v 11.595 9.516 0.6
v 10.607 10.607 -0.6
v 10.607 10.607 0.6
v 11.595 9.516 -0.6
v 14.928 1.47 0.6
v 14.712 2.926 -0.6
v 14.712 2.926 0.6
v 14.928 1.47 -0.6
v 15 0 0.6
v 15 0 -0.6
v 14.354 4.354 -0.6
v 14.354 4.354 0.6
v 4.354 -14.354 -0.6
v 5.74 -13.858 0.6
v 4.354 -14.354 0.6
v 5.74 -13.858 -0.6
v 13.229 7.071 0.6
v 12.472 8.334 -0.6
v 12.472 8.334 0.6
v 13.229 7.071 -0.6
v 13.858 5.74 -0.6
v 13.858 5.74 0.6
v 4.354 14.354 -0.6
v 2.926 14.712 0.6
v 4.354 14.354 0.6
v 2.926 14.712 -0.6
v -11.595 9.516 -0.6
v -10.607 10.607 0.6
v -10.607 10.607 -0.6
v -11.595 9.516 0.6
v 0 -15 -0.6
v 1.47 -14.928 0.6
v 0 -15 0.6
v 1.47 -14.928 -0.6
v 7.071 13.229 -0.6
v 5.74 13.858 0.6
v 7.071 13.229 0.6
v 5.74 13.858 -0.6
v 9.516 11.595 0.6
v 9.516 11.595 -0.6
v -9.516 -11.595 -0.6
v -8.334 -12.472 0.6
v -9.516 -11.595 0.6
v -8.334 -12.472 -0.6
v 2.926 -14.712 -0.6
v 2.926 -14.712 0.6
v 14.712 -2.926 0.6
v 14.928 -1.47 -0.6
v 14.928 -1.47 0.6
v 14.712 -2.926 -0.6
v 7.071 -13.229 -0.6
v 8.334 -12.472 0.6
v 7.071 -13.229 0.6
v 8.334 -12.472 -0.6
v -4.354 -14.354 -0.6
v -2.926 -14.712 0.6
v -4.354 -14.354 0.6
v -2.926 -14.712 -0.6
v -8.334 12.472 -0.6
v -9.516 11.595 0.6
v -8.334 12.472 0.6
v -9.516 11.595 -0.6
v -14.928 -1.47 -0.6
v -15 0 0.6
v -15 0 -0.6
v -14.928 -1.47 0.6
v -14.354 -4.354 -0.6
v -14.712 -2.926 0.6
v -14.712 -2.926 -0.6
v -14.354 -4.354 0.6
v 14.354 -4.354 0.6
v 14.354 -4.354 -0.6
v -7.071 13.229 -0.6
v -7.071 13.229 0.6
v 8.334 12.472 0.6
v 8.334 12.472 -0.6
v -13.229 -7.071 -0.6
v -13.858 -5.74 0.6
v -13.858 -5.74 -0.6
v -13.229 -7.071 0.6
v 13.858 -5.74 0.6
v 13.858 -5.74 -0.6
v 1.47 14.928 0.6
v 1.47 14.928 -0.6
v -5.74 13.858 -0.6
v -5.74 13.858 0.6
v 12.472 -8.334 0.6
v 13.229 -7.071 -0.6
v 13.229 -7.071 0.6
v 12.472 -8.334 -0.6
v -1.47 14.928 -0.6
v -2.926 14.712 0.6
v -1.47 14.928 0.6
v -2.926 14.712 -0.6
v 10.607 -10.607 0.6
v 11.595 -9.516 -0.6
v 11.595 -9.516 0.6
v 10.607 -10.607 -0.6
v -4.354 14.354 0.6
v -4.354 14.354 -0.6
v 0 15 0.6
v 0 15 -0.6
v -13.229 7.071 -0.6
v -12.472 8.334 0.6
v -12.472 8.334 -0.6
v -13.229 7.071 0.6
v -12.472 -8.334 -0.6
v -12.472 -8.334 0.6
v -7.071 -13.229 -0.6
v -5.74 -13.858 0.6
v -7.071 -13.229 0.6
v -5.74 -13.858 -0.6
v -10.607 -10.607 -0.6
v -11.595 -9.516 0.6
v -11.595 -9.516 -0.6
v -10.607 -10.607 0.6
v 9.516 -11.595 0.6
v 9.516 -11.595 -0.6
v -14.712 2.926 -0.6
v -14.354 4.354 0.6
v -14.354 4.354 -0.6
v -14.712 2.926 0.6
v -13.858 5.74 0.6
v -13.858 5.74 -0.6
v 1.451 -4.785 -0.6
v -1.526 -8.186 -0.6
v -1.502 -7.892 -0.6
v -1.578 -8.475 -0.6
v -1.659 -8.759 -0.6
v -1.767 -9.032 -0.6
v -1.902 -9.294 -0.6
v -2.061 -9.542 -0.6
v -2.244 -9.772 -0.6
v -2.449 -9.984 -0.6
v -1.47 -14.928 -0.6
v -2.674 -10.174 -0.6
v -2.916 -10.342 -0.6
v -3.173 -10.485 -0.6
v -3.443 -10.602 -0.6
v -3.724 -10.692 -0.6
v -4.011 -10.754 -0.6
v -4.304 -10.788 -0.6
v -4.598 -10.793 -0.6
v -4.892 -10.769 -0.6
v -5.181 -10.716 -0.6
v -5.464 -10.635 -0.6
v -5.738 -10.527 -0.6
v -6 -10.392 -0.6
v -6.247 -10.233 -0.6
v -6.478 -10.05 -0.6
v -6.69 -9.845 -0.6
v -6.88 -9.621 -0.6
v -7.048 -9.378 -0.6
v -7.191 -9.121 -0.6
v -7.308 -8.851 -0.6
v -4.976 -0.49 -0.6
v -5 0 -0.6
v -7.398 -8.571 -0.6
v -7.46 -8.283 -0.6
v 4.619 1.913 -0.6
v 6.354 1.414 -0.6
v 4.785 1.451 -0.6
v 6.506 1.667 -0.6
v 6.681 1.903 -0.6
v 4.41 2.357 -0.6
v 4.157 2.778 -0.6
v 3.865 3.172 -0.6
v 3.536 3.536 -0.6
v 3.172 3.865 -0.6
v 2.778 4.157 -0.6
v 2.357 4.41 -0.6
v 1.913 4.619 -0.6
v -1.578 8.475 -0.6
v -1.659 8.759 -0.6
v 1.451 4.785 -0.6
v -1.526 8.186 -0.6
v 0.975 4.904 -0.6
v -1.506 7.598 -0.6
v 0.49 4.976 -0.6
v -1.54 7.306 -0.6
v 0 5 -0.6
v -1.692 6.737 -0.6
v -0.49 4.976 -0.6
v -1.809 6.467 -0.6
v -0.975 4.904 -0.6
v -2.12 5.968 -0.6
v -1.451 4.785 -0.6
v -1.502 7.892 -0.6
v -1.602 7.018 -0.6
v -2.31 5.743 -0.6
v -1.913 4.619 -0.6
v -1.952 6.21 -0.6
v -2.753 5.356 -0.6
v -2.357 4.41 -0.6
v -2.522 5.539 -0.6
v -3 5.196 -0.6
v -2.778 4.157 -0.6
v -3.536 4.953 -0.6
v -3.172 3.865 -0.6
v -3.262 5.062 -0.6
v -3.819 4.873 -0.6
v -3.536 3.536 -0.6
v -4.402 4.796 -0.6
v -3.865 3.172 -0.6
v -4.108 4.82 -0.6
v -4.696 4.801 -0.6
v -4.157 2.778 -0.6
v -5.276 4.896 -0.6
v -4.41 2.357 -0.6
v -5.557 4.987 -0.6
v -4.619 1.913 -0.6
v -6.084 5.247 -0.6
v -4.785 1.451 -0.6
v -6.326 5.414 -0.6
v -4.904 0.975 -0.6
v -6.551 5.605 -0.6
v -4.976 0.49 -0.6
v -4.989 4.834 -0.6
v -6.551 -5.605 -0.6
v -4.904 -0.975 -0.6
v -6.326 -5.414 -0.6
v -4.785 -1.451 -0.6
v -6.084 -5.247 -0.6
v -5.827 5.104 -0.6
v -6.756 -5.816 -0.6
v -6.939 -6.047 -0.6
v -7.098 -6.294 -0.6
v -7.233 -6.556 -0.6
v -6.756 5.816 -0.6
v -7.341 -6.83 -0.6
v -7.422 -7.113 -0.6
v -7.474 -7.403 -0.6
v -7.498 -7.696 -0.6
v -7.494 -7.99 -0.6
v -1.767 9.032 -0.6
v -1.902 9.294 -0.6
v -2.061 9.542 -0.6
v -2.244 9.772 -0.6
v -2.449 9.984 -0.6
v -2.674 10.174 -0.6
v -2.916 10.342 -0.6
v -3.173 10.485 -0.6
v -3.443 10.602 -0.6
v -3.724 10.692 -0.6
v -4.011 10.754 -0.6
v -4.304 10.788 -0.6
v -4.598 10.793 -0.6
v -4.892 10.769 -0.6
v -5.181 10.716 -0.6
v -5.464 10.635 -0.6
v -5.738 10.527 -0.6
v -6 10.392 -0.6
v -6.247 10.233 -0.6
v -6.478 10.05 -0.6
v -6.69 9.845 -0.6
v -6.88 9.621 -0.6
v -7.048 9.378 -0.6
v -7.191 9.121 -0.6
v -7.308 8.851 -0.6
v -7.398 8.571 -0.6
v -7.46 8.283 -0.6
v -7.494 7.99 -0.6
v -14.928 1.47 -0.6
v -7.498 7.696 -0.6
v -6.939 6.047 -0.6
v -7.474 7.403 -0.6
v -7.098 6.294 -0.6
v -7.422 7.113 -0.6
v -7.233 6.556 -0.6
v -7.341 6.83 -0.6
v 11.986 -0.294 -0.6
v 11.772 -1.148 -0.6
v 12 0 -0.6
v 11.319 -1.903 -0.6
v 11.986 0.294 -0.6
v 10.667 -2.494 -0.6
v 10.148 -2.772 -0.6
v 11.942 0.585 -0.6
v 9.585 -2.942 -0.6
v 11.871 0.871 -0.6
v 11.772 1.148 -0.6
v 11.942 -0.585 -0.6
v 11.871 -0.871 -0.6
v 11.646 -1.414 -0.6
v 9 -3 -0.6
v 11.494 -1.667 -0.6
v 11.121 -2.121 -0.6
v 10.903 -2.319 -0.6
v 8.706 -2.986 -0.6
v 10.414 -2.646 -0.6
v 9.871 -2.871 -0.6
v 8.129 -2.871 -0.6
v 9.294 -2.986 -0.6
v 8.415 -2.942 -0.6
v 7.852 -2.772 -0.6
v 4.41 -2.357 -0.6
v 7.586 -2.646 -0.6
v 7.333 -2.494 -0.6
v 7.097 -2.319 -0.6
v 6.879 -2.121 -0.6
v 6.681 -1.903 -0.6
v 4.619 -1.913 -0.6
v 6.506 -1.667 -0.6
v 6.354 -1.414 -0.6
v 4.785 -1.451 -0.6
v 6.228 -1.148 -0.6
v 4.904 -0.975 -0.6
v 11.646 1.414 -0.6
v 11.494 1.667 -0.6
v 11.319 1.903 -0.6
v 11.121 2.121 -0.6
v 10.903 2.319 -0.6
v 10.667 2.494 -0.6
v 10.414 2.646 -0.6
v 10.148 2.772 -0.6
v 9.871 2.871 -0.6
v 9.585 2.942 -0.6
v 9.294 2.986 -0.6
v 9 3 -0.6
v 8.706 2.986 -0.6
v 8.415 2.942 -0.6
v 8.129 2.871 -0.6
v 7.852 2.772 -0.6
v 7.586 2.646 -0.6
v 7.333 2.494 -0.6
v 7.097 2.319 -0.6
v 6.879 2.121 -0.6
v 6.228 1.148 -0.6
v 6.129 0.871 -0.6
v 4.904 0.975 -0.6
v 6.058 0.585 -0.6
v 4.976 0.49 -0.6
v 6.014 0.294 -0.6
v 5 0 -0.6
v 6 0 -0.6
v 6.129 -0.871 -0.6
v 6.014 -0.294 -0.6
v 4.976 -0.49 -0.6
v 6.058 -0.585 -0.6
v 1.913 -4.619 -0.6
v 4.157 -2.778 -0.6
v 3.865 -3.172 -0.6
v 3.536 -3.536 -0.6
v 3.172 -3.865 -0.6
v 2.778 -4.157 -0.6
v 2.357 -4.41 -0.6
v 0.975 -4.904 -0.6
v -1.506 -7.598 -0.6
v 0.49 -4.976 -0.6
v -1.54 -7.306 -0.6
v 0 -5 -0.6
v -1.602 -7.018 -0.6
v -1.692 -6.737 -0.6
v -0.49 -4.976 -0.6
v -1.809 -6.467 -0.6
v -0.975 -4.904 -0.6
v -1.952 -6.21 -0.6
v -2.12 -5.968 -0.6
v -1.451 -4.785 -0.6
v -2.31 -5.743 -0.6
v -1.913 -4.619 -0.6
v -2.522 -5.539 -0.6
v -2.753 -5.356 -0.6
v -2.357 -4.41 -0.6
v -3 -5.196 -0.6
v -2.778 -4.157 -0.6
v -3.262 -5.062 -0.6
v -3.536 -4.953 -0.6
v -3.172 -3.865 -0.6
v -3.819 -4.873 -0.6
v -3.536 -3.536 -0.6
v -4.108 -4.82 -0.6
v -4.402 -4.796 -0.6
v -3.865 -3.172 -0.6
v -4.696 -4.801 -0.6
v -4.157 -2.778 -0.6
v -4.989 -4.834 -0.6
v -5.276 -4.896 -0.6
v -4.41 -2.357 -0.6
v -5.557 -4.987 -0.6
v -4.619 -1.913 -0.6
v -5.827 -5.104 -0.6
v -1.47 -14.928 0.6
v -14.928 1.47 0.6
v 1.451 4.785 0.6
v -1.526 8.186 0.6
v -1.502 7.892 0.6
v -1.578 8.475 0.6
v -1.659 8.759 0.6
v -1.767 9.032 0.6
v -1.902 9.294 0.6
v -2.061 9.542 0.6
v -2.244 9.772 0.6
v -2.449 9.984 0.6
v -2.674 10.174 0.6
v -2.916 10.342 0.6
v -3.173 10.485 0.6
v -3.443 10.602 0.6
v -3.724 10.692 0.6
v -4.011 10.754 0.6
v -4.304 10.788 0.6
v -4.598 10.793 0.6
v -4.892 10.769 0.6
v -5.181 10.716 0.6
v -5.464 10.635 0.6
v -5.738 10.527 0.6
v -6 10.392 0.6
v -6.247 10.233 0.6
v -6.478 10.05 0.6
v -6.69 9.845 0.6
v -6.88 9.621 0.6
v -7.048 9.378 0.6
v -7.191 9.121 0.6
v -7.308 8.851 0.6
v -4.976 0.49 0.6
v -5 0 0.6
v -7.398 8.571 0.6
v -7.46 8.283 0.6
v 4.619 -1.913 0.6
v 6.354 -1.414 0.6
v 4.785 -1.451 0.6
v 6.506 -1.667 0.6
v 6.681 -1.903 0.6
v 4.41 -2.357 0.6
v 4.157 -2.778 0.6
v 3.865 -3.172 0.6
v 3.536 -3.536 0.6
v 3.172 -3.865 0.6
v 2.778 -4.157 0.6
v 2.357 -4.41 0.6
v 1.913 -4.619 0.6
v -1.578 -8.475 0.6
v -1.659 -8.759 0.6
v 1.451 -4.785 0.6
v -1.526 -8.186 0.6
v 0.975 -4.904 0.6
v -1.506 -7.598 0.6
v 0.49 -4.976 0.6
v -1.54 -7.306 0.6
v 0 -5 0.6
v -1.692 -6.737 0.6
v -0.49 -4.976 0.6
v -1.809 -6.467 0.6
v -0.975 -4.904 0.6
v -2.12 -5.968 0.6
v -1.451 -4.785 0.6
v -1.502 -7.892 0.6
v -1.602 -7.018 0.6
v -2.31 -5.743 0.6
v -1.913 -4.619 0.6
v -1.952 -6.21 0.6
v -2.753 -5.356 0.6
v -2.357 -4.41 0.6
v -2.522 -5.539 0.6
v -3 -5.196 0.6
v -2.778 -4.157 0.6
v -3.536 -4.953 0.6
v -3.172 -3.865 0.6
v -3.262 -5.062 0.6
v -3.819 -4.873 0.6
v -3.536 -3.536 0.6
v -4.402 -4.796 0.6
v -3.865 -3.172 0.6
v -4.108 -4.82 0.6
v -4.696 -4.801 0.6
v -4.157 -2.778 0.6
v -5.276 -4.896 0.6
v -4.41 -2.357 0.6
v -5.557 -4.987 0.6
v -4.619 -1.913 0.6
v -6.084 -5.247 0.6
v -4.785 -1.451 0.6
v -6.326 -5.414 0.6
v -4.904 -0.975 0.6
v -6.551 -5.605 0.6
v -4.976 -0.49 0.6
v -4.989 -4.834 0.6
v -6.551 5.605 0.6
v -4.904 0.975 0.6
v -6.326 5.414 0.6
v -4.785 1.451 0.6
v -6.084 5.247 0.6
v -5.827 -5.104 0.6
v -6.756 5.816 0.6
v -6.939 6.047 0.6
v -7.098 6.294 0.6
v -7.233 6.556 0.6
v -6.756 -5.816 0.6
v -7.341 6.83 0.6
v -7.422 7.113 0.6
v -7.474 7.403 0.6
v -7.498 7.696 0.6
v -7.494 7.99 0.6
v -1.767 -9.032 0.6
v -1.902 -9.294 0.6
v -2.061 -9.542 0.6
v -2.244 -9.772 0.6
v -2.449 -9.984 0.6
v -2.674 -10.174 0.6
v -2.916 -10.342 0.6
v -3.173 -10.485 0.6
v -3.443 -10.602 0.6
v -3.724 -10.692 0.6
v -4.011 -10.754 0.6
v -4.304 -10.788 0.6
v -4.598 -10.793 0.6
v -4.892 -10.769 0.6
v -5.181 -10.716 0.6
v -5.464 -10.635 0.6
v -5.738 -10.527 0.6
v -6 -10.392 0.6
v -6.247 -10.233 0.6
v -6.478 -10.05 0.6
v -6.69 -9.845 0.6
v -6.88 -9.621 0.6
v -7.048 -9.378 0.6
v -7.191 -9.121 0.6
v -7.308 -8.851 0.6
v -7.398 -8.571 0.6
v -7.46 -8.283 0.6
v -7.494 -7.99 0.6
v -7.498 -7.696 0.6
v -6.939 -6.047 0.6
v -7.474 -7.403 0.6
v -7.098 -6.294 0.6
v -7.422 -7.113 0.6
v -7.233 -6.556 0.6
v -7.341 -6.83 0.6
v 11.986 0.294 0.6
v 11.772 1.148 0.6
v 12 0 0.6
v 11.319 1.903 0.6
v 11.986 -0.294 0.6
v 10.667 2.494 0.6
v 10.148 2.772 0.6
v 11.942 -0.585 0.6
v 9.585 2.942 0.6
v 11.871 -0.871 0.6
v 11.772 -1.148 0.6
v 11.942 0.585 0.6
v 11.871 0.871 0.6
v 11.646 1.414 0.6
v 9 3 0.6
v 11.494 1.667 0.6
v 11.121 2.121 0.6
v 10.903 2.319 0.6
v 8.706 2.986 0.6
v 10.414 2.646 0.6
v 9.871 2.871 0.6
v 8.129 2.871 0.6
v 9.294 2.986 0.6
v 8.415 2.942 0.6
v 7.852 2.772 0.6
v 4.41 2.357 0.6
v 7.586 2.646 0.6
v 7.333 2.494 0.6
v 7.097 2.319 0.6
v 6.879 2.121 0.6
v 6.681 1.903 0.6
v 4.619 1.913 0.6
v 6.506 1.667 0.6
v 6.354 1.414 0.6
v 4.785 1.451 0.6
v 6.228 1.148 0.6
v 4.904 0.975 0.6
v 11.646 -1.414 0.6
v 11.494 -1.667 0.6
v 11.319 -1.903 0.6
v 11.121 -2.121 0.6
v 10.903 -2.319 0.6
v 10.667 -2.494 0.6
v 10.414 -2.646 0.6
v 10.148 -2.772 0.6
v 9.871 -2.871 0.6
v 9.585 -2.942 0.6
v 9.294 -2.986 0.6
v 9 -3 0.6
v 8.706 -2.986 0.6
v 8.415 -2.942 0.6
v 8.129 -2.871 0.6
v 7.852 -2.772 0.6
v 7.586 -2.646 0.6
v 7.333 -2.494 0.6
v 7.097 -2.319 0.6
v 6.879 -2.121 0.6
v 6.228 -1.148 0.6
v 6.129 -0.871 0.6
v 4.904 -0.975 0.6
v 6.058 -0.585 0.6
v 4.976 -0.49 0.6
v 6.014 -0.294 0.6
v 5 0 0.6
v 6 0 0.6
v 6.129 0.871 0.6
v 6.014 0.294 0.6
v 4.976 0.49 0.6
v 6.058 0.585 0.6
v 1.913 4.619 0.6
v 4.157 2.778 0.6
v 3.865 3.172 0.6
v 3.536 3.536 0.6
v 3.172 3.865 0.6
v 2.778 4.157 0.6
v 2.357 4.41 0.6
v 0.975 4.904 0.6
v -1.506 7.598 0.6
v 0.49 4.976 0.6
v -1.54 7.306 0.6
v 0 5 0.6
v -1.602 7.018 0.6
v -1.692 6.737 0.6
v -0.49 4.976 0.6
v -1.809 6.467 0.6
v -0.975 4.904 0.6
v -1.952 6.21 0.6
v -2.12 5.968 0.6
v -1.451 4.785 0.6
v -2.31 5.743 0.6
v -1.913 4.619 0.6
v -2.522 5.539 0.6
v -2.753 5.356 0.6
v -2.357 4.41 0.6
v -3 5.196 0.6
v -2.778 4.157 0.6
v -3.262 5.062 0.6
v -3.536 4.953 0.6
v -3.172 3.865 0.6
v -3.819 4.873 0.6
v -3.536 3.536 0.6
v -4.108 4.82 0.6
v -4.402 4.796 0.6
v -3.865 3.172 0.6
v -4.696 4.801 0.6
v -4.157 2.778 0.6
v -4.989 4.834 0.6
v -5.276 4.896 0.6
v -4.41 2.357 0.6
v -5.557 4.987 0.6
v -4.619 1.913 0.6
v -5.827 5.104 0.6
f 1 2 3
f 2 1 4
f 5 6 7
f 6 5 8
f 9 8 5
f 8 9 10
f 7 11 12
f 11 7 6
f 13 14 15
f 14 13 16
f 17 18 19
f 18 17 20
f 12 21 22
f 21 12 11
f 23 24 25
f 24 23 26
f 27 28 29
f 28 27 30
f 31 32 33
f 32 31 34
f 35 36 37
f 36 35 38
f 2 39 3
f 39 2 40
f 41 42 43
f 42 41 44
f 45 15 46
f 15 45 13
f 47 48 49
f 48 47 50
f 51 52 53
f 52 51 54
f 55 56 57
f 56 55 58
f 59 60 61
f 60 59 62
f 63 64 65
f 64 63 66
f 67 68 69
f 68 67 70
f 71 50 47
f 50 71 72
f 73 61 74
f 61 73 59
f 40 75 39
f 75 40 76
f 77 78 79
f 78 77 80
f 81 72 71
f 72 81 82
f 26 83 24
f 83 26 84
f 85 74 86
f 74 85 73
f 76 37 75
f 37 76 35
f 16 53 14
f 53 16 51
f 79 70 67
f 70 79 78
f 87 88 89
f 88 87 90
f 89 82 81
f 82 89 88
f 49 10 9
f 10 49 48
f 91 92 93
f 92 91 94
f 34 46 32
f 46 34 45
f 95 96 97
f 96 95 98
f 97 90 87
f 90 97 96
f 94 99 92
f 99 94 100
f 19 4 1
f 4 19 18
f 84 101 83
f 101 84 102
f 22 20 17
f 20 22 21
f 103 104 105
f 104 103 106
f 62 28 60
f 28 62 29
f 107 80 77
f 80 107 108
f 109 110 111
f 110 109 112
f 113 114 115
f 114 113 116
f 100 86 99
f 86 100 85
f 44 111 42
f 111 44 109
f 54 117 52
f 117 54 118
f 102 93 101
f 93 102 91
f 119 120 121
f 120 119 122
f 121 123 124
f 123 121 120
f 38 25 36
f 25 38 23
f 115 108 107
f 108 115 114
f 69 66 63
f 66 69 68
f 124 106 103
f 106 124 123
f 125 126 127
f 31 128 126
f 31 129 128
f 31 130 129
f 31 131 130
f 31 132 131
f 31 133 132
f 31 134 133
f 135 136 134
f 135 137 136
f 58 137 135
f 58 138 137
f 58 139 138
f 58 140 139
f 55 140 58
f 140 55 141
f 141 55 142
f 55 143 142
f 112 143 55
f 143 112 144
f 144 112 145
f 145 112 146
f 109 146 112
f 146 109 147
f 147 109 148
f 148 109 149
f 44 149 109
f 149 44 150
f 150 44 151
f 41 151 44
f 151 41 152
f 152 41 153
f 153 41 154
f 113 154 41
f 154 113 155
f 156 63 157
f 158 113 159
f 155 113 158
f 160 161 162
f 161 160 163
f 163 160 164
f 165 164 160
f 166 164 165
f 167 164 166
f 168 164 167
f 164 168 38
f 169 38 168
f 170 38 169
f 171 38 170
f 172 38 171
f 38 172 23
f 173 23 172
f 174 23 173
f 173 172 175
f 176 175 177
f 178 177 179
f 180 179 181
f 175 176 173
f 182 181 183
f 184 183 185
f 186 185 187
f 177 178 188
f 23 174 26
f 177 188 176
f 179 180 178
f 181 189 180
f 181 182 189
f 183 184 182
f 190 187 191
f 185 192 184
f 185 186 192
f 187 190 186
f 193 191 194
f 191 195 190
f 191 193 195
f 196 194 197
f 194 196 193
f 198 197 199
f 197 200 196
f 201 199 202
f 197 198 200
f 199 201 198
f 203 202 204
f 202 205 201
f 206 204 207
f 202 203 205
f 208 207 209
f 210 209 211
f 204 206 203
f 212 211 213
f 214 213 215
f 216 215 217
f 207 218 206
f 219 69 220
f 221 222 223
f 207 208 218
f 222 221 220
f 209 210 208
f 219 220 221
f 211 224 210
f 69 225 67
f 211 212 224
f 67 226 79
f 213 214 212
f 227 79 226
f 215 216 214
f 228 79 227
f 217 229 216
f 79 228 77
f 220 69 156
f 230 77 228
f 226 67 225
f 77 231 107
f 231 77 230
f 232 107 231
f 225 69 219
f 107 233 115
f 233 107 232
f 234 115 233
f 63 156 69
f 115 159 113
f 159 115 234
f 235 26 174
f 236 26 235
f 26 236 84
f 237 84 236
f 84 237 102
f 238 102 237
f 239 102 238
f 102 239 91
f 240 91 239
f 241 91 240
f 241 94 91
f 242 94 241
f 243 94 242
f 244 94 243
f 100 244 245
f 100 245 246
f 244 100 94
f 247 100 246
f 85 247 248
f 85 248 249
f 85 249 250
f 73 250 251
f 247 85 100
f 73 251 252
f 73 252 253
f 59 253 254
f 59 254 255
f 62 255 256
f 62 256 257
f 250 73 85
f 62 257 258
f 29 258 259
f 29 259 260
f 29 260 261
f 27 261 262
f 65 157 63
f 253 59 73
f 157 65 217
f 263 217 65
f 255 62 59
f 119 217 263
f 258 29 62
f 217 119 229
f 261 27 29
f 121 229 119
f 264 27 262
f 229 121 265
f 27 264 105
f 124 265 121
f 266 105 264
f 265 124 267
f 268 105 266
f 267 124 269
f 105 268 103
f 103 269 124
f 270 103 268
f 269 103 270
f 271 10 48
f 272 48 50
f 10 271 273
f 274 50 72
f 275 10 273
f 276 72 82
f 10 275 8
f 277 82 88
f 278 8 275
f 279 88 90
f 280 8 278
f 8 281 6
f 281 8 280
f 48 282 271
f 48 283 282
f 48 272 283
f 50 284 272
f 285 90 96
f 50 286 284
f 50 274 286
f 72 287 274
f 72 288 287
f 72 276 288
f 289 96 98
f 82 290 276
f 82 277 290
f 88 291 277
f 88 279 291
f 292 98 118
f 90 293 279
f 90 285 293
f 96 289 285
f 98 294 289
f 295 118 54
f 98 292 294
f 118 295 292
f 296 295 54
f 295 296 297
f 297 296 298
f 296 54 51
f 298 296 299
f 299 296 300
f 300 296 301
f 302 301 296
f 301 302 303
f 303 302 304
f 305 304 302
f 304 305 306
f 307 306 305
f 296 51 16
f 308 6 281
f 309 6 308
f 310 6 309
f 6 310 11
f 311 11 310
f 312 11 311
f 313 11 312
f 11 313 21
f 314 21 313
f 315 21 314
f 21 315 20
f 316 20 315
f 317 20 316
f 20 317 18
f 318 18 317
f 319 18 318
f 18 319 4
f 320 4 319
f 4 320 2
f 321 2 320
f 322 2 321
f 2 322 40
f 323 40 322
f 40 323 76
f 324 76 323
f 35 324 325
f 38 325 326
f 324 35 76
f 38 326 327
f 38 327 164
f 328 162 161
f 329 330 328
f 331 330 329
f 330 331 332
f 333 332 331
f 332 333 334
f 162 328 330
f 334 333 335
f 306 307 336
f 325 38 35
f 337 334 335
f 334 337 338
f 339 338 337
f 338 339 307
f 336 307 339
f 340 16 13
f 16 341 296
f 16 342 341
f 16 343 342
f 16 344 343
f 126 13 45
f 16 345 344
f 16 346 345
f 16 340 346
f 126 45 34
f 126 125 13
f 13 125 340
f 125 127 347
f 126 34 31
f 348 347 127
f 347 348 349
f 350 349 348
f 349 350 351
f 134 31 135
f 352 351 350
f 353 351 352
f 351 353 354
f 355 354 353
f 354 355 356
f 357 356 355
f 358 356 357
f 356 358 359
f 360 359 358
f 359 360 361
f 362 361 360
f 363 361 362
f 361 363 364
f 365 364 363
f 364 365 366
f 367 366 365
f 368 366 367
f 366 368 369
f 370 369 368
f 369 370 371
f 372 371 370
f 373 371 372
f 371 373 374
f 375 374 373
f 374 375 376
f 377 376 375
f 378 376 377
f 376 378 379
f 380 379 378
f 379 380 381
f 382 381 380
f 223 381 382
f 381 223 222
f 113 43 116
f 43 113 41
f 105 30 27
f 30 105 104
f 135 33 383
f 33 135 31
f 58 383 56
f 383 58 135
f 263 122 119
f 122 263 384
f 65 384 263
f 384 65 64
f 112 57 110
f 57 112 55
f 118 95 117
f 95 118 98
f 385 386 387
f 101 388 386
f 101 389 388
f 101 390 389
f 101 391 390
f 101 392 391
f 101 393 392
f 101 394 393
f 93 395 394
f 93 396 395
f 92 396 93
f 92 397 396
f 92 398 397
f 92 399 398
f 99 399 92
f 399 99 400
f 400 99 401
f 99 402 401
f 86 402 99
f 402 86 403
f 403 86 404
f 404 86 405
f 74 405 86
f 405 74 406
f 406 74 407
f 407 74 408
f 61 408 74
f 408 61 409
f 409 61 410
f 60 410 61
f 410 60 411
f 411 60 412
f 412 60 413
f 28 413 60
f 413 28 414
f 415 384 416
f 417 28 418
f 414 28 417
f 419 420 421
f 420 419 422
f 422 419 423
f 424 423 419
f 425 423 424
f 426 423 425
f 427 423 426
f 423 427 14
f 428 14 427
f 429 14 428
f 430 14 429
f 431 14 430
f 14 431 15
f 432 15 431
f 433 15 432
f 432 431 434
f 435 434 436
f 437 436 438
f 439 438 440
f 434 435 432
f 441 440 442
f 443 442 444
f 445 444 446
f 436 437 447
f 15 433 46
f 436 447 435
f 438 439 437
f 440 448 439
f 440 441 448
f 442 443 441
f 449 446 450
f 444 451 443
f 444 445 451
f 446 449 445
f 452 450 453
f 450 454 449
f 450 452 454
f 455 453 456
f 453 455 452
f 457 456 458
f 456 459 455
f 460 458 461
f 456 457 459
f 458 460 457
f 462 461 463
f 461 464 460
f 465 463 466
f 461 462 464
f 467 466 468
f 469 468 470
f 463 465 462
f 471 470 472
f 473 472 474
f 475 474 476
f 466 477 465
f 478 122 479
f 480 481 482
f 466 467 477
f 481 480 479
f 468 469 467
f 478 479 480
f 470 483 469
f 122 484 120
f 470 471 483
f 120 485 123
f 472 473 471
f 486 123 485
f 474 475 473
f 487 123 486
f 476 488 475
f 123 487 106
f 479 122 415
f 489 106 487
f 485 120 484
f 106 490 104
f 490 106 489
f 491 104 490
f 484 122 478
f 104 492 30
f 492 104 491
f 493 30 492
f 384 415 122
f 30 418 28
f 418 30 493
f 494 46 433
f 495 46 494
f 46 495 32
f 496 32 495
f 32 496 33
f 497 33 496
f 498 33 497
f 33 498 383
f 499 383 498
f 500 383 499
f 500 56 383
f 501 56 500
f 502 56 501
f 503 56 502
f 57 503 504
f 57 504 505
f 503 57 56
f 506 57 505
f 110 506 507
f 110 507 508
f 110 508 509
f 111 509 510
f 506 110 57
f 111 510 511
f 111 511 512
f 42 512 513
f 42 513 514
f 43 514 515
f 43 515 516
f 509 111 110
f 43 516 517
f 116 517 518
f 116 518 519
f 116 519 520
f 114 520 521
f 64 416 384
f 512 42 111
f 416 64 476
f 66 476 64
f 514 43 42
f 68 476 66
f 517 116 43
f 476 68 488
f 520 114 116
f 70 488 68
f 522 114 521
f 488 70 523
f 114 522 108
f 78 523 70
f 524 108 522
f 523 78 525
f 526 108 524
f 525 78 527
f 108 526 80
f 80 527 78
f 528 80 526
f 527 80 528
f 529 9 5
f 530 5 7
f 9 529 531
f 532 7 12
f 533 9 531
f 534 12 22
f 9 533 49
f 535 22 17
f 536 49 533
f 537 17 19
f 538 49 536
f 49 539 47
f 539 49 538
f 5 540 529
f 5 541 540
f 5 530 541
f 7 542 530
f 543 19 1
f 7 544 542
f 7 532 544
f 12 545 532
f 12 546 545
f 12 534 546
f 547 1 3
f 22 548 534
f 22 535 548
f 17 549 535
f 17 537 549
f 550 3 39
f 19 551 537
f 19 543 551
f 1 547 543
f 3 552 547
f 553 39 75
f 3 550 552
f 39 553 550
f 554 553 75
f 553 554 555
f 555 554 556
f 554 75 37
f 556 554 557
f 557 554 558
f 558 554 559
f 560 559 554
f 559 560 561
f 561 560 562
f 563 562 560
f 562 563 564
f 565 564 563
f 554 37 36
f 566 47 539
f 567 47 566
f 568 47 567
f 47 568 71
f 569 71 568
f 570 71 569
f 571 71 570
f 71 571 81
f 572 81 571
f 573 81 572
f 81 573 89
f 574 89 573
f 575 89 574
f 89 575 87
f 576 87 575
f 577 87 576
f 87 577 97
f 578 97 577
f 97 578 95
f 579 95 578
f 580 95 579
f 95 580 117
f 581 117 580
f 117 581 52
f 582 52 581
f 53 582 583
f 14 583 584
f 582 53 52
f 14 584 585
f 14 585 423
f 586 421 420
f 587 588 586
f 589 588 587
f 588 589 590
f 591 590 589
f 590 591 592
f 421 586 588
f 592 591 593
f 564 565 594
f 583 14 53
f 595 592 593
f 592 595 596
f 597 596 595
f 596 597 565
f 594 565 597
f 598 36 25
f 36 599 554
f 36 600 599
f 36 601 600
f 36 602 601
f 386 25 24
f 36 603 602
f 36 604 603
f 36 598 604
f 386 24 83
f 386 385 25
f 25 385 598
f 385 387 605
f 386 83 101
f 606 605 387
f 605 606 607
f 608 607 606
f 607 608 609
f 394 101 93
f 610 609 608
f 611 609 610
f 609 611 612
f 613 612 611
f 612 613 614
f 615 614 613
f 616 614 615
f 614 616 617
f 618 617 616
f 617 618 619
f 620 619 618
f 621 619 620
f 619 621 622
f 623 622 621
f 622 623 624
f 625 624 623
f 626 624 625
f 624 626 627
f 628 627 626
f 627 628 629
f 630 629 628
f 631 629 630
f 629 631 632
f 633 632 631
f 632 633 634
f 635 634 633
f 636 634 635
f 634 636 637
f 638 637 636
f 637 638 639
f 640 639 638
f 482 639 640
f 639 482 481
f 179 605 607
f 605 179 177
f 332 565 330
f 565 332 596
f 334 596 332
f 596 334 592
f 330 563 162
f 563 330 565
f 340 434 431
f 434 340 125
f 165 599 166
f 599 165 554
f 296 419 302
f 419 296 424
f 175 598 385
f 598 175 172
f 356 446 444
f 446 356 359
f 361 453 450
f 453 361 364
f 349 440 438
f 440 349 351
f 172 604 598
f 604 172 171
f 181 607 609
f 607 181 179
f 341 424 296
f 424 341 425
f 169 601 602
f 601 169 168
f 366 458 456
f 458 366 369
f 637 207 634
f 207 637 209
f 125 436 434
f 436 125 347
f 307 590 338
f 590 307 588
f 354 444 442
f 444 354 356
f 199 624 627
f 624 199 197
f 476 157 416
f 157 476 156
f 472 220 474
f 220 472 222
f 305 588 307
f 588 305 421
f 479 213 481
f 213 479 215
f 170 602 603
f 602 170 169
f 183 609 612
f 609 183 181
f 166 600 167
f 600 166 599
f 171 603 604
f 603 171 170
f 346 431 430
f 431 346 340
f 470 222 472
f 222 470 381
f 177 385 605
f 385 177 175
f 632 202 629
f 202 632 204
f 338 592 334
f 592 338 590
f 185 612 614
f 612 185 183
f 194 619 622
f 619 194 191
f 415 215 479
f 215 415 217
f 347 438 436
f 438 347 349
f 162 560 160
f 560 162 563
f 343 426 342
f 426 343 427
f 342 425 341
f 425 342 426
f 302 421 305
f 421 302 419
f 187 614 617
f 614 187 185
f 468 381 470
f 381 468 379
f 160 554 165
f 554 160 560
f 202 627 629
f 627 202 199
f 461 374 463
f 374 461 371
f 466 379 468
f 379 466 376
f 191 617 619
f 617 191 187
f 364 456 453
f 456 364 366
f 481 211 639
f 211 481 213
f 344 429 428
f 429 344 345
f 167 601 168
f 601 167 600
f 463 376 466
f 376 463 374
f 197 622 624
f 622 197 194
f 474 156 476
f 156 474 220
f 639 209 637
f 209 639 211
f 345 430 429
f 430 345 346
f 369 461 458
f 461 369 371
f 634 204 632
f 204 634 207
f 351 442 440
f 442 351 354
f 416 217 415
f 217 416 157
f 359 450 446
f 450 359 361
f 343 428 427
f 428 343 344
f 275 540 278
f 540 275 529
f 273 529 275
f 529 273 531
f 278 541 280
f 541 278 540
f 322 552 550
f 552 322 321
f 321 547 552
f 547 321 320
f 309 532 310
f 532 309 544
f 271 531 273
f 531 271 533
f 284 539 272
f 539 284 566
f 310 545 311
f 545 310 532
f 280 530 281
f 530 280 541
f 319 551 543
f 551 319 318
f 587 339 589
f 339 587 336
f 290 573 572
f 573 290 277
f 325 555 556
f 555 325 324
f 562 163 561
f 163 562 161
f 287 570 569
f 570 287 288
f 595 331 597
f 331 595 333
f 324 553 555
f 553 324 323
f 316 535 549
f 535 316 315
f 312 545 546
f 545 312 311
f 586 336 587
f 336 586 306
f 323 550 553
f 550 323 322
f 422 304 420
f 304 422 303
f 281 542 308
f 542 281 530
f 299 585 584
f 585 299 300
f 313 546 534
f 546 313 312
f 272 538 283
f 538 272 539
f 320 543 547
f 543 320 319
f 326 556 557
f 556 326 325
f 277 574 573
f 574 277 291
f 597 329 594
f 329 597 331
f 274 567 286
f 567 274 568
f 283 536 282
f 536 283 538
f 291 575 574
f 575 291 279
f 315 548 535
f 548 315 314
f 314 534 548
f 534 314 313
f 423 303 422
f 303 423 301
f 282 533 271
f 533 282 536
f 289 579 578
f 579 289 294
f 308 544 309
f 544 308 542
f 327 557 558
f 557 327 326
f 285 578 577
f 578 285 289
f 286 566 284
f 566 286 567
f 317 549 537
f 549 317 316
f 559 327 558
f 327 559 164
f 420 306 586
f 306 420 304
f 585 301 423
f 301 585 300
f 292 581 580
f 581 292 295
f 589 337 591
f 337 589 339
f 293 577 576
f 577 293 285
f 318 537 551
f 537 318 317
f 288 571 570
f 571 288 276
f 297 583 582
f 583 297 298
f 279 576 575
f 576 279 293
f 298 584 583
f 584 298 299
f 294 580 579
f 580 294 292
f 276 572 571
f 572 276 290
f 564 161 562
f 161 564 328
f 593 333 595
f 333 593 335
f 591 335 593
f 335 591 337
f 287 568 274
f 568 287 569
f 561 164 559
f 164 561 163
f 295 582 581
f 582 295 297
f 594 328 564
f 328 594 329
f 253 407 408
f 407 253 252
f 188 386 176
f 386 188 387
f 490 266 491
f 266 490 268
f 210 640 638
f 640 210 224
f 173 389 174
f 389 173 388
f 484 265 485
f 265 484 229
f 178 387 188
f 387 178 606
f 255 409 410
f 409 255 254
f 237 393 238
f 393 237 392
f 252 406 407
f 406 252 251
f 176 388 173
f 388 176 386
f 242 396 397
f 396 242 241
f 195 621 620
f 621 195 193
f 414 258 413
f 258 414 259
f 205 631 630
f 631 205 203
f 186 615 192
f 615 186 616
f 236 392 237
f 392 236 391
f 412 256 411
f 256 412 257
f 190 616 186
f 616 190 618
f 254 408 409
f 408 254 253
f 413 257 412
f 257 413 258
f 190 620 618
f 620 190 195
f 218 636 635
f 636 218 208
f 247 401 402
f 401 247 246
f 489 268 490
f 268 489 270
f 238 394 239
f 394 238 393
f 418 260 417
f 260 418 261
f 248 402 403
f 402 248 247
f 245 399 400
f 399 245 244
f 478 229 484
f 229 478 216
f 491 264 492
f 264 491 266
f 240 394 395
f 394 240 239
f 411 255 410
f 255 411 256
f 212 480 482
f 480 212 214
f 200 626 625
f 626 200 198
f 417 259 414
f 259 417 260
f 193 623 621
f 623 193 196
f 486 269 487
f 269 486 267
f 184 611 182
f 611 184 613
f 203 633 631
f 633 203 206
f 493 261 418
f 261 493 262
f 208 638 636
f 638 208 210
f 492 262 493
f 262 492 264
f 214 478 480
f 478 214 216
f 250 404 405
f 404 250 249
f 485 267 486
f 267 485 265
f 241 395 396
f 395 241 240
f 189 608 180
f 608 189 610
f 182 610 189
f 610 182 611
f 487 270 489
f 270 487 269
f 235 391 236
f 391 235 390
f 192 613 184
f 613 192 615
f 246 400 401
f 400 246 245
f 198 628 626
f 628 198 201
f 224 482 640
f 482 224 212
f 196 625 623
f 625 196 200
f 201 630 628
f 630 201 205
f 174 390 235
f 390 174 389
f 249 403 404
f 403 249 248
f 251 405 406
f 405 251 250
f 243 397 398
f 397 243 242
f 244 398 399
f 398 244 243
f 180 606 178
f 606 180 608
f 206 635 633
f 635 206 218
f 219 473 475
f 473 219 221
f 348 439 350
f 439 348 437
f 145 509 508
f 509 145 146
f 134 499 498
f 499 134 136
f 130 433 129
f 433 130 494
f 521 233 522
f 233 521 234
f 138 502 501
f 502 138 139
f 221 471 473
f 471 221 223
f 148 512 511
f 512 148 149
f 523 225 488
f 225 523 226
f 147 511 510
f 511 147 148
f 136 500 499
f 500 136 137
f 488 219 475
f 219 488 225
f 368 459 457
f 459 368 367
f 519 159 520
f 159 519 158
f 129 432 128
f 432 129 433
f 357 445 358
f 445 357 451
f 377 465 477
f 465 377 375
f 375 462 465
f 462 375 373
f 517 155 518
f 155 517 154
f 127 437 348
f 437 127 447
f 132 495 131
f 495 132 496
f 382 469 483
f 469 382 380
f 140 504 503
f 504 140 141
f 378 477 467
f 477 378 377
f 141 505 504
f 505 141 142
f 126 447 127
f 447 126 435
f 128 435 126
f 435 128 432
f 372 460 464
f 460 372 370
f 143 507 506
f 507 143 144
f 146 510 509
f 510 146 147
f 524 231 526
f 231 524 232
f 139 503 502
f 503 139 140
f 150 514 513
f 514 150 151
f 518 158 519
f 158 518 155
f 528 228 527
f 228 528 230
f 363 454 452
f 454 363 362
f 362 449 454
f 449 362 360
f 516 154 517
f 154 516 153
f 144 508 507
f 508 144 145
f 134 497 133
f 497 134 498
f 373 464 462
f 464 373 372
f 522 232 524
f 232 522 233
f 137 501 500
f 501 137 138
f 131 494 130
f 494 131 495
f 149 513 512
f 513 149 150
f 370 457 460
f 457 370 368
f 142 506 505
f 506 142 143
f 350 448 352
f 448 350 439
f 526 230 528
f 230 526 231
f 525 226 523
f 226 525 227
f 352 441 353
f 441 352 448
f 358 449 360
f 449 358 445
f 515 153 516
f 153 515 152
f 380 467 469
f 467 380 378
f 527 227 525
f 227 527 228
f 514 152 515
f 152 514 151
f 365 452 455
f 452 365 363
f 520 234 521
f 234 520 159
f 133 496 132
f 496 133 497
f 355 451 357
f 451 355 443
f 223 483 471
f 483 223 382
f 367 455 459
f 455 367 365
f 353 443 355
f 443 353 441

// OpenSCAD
thick=1.2;

module ballhole() {translate([9,0,0])cylinder(h=thick+0.01,d=6,center=true, $fn=64);}

difference()
{
  cylinder(h=thick,d=30,center=true, $fn=64);
  cylinder(h=thick+0.01,d=10,center=true, $fn=64);
  rotate([0,0,0])ballhole();
  rotate([0,0,120])ballhole();
  rotate([0,0,-120])ballhole();
  
}
